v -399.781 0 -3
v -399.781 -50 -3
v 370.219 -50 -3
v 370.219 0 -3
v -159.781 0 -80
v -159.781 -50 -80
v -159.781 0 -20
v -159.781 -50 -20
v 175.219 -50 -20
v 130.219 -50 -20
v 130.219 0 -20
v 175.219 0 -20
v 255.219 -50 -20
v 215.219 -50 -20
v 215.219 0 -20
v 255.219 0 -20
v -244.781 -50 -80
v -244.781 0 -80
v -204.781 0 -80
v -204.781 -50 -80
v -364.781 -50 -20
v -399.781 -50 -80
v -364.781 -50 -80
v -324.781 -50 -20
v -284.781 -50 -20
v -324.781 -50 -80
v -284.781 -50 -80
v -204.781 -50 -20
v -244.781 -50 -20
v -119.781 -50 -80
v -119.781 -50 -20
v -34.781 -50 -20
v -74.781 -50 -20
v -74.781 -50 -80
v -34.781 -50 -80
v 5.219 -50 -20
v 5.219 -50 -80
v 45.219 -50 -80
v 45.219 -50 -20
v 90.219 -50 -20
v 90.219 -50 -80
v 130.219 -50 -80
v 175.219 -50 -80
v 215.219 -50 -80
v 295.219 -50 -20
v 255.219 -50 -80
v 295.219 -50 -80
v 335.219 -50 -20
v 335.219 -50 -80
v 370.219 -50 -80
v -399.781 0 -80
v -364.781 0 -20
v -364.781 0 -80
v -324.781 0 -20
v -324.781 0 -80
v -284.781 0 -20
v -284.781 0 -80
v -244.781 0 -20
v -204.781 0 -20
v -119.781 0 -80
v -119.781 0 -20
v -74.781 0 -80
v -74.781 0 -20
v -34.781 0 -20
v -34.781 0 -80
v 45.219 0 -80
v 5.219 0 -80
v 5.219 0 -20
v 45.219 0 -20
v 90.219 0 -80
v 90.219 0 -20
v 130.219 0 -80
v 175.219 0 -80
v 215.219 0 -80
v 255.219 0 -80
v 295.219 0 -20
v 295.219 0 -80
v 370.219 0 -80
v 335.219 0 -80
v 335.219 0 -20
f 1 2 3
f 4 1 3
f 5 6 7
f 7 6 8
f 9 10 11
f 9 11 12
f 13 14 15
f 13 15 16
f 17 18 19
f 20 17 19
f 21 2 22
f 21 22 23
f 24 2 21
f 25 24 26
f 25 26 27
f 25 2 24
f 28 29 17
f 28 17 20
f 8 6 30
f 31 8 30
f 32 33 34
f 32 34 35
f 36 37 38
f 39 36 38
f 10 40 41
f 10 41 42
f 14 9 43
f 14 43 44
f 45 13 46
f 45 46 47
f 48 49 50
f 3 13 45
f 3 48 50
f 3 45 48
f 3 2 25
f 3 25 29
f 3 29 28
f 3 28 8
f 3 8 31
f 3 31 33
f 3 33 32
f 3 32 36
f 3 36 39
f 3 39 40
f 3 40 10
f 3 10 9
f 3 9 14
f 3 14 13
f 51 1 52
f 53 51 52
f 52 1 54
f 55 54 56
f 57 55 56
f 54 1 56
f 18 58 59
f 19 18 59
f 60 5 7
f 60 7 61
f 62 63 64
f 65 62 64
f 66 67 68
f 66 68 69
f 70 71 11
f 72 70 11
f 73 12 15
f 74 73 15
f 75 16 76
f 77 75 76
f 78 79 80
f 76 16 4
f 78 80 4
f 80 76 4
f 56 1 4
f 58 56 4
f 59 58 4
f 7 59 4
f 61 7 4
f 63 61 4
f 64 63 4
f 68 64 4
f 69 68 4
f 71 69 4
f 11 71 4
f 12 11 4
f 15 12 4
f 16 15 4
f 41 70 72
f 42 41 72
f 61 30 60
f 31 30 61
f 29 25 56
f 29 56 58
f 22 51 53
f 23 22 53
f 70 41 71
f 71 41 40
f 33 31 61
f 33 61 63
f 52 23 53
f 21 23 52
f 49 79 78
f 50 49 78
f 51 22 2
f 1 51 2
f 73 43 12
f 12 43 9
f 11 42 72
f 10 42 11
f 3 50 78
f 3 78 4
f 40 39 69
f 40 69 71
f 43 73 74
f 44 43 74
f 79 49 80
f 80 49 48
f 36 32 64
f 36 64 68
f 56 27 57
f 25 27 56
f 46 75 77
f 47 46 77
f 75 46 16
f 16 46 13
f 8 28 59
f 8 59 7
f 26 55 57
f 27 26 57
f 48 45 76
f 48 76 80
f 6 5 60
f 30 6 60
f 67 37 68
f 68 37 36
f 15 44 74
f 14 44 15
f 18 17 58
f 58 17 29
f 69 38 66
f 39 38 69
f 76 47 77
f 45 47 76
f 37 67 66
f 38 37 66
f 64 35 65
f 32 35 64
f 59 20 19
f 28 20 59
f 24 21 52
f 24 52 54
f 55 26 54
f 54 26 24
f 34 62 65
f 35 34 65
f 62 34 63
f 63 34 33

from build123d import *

# Parameters (mm, degrees)
F0_W     = 780
F0_H     = 80
F1_DEPTH = 50
F2_W     = 40
F2_H     = 60
F2_W_2   = 45
F3_DEPTH = 50
F4_W     = 780
F4_H     = 3
F5_DEPTH = 50
F6_W     = 5
F6_H     = 77
F7_DEPTH = 50
F8_W     = 5
F8_H     = 77
F9_DEPTH = 50


with BuildPart() as f1:
    # F0 (on Front) → F1 (new body)
    with BuildSketch(Plane.XZ):
        with Locations((-14.780855, -40)):
            Rectangle(F0_W, F0_H)
    extrude(amount=F1_DEPTH)

    # F2 (on face) → F3 (cut)
    with BuildSketch(Plane.XZ.offset(50)):
        with Locations((-344.780855, -50)):
            Rectangle(F2_W, F2_H)
        with Locations((-264.780855, -50)):
            Rectangle(F2_W, F2_H)
        with Locations((-182.280855, -50)):
            Rectangle(F2_W_2, F2_H)
        with Locations((-97.280855, -50)):
            Rectangle(F2_W_2, F2_H)
        with Locations((-14.780855, -50)):
            Rectangle(F2_W, F2_H)
        with Locations((67.719145, -50)):
            Rectangle(F2_W_2, F2_H)
        with Locations((152.719145, -50)):
            Rectangle(F2_W_2, F2_H)
        with Locations((235.219145, -50)):
            Rectangle(F2_W, F2_H)
        with Locations((315.219145, -50)):
            Rectangle(F2_W, F2_H)
    extrude(amount=-F3_DEPTH, mode=Mode.SUBTRACT)

    # F4 (on face) → F5 (cut, through all)
    with BuildSketch(Plane.XZ.offset(50)):
        with Locations((-14.780855, -1.5)):
            Rectangle(F4_W, F4_H)
    extrude(amount=-F5_DEPTH, mode=Mode.SUBTRACT)

    # F6 (on face) → F7 (cut, through all)
    with BuildSketch(Plane.XZ.offset(50)):
        with Locations((-402.280855, -41.5)):
            Rectangle(F6_W, F6_H)
    extrude(amount=-F7_DEPTH, mode=Mode.SUBTRACT)

    # F8 (on face) → F9 (cut, through all)
    with BuildSketch(Plane.XZ.offset(50)):
        with Locations((372.719145, -41.5)):
            Rectangle(F8_W, F8_H)
    extrude(amount=-F9_DEPTH, mode=Mode.SUBTRACT)


solid = f1.part
